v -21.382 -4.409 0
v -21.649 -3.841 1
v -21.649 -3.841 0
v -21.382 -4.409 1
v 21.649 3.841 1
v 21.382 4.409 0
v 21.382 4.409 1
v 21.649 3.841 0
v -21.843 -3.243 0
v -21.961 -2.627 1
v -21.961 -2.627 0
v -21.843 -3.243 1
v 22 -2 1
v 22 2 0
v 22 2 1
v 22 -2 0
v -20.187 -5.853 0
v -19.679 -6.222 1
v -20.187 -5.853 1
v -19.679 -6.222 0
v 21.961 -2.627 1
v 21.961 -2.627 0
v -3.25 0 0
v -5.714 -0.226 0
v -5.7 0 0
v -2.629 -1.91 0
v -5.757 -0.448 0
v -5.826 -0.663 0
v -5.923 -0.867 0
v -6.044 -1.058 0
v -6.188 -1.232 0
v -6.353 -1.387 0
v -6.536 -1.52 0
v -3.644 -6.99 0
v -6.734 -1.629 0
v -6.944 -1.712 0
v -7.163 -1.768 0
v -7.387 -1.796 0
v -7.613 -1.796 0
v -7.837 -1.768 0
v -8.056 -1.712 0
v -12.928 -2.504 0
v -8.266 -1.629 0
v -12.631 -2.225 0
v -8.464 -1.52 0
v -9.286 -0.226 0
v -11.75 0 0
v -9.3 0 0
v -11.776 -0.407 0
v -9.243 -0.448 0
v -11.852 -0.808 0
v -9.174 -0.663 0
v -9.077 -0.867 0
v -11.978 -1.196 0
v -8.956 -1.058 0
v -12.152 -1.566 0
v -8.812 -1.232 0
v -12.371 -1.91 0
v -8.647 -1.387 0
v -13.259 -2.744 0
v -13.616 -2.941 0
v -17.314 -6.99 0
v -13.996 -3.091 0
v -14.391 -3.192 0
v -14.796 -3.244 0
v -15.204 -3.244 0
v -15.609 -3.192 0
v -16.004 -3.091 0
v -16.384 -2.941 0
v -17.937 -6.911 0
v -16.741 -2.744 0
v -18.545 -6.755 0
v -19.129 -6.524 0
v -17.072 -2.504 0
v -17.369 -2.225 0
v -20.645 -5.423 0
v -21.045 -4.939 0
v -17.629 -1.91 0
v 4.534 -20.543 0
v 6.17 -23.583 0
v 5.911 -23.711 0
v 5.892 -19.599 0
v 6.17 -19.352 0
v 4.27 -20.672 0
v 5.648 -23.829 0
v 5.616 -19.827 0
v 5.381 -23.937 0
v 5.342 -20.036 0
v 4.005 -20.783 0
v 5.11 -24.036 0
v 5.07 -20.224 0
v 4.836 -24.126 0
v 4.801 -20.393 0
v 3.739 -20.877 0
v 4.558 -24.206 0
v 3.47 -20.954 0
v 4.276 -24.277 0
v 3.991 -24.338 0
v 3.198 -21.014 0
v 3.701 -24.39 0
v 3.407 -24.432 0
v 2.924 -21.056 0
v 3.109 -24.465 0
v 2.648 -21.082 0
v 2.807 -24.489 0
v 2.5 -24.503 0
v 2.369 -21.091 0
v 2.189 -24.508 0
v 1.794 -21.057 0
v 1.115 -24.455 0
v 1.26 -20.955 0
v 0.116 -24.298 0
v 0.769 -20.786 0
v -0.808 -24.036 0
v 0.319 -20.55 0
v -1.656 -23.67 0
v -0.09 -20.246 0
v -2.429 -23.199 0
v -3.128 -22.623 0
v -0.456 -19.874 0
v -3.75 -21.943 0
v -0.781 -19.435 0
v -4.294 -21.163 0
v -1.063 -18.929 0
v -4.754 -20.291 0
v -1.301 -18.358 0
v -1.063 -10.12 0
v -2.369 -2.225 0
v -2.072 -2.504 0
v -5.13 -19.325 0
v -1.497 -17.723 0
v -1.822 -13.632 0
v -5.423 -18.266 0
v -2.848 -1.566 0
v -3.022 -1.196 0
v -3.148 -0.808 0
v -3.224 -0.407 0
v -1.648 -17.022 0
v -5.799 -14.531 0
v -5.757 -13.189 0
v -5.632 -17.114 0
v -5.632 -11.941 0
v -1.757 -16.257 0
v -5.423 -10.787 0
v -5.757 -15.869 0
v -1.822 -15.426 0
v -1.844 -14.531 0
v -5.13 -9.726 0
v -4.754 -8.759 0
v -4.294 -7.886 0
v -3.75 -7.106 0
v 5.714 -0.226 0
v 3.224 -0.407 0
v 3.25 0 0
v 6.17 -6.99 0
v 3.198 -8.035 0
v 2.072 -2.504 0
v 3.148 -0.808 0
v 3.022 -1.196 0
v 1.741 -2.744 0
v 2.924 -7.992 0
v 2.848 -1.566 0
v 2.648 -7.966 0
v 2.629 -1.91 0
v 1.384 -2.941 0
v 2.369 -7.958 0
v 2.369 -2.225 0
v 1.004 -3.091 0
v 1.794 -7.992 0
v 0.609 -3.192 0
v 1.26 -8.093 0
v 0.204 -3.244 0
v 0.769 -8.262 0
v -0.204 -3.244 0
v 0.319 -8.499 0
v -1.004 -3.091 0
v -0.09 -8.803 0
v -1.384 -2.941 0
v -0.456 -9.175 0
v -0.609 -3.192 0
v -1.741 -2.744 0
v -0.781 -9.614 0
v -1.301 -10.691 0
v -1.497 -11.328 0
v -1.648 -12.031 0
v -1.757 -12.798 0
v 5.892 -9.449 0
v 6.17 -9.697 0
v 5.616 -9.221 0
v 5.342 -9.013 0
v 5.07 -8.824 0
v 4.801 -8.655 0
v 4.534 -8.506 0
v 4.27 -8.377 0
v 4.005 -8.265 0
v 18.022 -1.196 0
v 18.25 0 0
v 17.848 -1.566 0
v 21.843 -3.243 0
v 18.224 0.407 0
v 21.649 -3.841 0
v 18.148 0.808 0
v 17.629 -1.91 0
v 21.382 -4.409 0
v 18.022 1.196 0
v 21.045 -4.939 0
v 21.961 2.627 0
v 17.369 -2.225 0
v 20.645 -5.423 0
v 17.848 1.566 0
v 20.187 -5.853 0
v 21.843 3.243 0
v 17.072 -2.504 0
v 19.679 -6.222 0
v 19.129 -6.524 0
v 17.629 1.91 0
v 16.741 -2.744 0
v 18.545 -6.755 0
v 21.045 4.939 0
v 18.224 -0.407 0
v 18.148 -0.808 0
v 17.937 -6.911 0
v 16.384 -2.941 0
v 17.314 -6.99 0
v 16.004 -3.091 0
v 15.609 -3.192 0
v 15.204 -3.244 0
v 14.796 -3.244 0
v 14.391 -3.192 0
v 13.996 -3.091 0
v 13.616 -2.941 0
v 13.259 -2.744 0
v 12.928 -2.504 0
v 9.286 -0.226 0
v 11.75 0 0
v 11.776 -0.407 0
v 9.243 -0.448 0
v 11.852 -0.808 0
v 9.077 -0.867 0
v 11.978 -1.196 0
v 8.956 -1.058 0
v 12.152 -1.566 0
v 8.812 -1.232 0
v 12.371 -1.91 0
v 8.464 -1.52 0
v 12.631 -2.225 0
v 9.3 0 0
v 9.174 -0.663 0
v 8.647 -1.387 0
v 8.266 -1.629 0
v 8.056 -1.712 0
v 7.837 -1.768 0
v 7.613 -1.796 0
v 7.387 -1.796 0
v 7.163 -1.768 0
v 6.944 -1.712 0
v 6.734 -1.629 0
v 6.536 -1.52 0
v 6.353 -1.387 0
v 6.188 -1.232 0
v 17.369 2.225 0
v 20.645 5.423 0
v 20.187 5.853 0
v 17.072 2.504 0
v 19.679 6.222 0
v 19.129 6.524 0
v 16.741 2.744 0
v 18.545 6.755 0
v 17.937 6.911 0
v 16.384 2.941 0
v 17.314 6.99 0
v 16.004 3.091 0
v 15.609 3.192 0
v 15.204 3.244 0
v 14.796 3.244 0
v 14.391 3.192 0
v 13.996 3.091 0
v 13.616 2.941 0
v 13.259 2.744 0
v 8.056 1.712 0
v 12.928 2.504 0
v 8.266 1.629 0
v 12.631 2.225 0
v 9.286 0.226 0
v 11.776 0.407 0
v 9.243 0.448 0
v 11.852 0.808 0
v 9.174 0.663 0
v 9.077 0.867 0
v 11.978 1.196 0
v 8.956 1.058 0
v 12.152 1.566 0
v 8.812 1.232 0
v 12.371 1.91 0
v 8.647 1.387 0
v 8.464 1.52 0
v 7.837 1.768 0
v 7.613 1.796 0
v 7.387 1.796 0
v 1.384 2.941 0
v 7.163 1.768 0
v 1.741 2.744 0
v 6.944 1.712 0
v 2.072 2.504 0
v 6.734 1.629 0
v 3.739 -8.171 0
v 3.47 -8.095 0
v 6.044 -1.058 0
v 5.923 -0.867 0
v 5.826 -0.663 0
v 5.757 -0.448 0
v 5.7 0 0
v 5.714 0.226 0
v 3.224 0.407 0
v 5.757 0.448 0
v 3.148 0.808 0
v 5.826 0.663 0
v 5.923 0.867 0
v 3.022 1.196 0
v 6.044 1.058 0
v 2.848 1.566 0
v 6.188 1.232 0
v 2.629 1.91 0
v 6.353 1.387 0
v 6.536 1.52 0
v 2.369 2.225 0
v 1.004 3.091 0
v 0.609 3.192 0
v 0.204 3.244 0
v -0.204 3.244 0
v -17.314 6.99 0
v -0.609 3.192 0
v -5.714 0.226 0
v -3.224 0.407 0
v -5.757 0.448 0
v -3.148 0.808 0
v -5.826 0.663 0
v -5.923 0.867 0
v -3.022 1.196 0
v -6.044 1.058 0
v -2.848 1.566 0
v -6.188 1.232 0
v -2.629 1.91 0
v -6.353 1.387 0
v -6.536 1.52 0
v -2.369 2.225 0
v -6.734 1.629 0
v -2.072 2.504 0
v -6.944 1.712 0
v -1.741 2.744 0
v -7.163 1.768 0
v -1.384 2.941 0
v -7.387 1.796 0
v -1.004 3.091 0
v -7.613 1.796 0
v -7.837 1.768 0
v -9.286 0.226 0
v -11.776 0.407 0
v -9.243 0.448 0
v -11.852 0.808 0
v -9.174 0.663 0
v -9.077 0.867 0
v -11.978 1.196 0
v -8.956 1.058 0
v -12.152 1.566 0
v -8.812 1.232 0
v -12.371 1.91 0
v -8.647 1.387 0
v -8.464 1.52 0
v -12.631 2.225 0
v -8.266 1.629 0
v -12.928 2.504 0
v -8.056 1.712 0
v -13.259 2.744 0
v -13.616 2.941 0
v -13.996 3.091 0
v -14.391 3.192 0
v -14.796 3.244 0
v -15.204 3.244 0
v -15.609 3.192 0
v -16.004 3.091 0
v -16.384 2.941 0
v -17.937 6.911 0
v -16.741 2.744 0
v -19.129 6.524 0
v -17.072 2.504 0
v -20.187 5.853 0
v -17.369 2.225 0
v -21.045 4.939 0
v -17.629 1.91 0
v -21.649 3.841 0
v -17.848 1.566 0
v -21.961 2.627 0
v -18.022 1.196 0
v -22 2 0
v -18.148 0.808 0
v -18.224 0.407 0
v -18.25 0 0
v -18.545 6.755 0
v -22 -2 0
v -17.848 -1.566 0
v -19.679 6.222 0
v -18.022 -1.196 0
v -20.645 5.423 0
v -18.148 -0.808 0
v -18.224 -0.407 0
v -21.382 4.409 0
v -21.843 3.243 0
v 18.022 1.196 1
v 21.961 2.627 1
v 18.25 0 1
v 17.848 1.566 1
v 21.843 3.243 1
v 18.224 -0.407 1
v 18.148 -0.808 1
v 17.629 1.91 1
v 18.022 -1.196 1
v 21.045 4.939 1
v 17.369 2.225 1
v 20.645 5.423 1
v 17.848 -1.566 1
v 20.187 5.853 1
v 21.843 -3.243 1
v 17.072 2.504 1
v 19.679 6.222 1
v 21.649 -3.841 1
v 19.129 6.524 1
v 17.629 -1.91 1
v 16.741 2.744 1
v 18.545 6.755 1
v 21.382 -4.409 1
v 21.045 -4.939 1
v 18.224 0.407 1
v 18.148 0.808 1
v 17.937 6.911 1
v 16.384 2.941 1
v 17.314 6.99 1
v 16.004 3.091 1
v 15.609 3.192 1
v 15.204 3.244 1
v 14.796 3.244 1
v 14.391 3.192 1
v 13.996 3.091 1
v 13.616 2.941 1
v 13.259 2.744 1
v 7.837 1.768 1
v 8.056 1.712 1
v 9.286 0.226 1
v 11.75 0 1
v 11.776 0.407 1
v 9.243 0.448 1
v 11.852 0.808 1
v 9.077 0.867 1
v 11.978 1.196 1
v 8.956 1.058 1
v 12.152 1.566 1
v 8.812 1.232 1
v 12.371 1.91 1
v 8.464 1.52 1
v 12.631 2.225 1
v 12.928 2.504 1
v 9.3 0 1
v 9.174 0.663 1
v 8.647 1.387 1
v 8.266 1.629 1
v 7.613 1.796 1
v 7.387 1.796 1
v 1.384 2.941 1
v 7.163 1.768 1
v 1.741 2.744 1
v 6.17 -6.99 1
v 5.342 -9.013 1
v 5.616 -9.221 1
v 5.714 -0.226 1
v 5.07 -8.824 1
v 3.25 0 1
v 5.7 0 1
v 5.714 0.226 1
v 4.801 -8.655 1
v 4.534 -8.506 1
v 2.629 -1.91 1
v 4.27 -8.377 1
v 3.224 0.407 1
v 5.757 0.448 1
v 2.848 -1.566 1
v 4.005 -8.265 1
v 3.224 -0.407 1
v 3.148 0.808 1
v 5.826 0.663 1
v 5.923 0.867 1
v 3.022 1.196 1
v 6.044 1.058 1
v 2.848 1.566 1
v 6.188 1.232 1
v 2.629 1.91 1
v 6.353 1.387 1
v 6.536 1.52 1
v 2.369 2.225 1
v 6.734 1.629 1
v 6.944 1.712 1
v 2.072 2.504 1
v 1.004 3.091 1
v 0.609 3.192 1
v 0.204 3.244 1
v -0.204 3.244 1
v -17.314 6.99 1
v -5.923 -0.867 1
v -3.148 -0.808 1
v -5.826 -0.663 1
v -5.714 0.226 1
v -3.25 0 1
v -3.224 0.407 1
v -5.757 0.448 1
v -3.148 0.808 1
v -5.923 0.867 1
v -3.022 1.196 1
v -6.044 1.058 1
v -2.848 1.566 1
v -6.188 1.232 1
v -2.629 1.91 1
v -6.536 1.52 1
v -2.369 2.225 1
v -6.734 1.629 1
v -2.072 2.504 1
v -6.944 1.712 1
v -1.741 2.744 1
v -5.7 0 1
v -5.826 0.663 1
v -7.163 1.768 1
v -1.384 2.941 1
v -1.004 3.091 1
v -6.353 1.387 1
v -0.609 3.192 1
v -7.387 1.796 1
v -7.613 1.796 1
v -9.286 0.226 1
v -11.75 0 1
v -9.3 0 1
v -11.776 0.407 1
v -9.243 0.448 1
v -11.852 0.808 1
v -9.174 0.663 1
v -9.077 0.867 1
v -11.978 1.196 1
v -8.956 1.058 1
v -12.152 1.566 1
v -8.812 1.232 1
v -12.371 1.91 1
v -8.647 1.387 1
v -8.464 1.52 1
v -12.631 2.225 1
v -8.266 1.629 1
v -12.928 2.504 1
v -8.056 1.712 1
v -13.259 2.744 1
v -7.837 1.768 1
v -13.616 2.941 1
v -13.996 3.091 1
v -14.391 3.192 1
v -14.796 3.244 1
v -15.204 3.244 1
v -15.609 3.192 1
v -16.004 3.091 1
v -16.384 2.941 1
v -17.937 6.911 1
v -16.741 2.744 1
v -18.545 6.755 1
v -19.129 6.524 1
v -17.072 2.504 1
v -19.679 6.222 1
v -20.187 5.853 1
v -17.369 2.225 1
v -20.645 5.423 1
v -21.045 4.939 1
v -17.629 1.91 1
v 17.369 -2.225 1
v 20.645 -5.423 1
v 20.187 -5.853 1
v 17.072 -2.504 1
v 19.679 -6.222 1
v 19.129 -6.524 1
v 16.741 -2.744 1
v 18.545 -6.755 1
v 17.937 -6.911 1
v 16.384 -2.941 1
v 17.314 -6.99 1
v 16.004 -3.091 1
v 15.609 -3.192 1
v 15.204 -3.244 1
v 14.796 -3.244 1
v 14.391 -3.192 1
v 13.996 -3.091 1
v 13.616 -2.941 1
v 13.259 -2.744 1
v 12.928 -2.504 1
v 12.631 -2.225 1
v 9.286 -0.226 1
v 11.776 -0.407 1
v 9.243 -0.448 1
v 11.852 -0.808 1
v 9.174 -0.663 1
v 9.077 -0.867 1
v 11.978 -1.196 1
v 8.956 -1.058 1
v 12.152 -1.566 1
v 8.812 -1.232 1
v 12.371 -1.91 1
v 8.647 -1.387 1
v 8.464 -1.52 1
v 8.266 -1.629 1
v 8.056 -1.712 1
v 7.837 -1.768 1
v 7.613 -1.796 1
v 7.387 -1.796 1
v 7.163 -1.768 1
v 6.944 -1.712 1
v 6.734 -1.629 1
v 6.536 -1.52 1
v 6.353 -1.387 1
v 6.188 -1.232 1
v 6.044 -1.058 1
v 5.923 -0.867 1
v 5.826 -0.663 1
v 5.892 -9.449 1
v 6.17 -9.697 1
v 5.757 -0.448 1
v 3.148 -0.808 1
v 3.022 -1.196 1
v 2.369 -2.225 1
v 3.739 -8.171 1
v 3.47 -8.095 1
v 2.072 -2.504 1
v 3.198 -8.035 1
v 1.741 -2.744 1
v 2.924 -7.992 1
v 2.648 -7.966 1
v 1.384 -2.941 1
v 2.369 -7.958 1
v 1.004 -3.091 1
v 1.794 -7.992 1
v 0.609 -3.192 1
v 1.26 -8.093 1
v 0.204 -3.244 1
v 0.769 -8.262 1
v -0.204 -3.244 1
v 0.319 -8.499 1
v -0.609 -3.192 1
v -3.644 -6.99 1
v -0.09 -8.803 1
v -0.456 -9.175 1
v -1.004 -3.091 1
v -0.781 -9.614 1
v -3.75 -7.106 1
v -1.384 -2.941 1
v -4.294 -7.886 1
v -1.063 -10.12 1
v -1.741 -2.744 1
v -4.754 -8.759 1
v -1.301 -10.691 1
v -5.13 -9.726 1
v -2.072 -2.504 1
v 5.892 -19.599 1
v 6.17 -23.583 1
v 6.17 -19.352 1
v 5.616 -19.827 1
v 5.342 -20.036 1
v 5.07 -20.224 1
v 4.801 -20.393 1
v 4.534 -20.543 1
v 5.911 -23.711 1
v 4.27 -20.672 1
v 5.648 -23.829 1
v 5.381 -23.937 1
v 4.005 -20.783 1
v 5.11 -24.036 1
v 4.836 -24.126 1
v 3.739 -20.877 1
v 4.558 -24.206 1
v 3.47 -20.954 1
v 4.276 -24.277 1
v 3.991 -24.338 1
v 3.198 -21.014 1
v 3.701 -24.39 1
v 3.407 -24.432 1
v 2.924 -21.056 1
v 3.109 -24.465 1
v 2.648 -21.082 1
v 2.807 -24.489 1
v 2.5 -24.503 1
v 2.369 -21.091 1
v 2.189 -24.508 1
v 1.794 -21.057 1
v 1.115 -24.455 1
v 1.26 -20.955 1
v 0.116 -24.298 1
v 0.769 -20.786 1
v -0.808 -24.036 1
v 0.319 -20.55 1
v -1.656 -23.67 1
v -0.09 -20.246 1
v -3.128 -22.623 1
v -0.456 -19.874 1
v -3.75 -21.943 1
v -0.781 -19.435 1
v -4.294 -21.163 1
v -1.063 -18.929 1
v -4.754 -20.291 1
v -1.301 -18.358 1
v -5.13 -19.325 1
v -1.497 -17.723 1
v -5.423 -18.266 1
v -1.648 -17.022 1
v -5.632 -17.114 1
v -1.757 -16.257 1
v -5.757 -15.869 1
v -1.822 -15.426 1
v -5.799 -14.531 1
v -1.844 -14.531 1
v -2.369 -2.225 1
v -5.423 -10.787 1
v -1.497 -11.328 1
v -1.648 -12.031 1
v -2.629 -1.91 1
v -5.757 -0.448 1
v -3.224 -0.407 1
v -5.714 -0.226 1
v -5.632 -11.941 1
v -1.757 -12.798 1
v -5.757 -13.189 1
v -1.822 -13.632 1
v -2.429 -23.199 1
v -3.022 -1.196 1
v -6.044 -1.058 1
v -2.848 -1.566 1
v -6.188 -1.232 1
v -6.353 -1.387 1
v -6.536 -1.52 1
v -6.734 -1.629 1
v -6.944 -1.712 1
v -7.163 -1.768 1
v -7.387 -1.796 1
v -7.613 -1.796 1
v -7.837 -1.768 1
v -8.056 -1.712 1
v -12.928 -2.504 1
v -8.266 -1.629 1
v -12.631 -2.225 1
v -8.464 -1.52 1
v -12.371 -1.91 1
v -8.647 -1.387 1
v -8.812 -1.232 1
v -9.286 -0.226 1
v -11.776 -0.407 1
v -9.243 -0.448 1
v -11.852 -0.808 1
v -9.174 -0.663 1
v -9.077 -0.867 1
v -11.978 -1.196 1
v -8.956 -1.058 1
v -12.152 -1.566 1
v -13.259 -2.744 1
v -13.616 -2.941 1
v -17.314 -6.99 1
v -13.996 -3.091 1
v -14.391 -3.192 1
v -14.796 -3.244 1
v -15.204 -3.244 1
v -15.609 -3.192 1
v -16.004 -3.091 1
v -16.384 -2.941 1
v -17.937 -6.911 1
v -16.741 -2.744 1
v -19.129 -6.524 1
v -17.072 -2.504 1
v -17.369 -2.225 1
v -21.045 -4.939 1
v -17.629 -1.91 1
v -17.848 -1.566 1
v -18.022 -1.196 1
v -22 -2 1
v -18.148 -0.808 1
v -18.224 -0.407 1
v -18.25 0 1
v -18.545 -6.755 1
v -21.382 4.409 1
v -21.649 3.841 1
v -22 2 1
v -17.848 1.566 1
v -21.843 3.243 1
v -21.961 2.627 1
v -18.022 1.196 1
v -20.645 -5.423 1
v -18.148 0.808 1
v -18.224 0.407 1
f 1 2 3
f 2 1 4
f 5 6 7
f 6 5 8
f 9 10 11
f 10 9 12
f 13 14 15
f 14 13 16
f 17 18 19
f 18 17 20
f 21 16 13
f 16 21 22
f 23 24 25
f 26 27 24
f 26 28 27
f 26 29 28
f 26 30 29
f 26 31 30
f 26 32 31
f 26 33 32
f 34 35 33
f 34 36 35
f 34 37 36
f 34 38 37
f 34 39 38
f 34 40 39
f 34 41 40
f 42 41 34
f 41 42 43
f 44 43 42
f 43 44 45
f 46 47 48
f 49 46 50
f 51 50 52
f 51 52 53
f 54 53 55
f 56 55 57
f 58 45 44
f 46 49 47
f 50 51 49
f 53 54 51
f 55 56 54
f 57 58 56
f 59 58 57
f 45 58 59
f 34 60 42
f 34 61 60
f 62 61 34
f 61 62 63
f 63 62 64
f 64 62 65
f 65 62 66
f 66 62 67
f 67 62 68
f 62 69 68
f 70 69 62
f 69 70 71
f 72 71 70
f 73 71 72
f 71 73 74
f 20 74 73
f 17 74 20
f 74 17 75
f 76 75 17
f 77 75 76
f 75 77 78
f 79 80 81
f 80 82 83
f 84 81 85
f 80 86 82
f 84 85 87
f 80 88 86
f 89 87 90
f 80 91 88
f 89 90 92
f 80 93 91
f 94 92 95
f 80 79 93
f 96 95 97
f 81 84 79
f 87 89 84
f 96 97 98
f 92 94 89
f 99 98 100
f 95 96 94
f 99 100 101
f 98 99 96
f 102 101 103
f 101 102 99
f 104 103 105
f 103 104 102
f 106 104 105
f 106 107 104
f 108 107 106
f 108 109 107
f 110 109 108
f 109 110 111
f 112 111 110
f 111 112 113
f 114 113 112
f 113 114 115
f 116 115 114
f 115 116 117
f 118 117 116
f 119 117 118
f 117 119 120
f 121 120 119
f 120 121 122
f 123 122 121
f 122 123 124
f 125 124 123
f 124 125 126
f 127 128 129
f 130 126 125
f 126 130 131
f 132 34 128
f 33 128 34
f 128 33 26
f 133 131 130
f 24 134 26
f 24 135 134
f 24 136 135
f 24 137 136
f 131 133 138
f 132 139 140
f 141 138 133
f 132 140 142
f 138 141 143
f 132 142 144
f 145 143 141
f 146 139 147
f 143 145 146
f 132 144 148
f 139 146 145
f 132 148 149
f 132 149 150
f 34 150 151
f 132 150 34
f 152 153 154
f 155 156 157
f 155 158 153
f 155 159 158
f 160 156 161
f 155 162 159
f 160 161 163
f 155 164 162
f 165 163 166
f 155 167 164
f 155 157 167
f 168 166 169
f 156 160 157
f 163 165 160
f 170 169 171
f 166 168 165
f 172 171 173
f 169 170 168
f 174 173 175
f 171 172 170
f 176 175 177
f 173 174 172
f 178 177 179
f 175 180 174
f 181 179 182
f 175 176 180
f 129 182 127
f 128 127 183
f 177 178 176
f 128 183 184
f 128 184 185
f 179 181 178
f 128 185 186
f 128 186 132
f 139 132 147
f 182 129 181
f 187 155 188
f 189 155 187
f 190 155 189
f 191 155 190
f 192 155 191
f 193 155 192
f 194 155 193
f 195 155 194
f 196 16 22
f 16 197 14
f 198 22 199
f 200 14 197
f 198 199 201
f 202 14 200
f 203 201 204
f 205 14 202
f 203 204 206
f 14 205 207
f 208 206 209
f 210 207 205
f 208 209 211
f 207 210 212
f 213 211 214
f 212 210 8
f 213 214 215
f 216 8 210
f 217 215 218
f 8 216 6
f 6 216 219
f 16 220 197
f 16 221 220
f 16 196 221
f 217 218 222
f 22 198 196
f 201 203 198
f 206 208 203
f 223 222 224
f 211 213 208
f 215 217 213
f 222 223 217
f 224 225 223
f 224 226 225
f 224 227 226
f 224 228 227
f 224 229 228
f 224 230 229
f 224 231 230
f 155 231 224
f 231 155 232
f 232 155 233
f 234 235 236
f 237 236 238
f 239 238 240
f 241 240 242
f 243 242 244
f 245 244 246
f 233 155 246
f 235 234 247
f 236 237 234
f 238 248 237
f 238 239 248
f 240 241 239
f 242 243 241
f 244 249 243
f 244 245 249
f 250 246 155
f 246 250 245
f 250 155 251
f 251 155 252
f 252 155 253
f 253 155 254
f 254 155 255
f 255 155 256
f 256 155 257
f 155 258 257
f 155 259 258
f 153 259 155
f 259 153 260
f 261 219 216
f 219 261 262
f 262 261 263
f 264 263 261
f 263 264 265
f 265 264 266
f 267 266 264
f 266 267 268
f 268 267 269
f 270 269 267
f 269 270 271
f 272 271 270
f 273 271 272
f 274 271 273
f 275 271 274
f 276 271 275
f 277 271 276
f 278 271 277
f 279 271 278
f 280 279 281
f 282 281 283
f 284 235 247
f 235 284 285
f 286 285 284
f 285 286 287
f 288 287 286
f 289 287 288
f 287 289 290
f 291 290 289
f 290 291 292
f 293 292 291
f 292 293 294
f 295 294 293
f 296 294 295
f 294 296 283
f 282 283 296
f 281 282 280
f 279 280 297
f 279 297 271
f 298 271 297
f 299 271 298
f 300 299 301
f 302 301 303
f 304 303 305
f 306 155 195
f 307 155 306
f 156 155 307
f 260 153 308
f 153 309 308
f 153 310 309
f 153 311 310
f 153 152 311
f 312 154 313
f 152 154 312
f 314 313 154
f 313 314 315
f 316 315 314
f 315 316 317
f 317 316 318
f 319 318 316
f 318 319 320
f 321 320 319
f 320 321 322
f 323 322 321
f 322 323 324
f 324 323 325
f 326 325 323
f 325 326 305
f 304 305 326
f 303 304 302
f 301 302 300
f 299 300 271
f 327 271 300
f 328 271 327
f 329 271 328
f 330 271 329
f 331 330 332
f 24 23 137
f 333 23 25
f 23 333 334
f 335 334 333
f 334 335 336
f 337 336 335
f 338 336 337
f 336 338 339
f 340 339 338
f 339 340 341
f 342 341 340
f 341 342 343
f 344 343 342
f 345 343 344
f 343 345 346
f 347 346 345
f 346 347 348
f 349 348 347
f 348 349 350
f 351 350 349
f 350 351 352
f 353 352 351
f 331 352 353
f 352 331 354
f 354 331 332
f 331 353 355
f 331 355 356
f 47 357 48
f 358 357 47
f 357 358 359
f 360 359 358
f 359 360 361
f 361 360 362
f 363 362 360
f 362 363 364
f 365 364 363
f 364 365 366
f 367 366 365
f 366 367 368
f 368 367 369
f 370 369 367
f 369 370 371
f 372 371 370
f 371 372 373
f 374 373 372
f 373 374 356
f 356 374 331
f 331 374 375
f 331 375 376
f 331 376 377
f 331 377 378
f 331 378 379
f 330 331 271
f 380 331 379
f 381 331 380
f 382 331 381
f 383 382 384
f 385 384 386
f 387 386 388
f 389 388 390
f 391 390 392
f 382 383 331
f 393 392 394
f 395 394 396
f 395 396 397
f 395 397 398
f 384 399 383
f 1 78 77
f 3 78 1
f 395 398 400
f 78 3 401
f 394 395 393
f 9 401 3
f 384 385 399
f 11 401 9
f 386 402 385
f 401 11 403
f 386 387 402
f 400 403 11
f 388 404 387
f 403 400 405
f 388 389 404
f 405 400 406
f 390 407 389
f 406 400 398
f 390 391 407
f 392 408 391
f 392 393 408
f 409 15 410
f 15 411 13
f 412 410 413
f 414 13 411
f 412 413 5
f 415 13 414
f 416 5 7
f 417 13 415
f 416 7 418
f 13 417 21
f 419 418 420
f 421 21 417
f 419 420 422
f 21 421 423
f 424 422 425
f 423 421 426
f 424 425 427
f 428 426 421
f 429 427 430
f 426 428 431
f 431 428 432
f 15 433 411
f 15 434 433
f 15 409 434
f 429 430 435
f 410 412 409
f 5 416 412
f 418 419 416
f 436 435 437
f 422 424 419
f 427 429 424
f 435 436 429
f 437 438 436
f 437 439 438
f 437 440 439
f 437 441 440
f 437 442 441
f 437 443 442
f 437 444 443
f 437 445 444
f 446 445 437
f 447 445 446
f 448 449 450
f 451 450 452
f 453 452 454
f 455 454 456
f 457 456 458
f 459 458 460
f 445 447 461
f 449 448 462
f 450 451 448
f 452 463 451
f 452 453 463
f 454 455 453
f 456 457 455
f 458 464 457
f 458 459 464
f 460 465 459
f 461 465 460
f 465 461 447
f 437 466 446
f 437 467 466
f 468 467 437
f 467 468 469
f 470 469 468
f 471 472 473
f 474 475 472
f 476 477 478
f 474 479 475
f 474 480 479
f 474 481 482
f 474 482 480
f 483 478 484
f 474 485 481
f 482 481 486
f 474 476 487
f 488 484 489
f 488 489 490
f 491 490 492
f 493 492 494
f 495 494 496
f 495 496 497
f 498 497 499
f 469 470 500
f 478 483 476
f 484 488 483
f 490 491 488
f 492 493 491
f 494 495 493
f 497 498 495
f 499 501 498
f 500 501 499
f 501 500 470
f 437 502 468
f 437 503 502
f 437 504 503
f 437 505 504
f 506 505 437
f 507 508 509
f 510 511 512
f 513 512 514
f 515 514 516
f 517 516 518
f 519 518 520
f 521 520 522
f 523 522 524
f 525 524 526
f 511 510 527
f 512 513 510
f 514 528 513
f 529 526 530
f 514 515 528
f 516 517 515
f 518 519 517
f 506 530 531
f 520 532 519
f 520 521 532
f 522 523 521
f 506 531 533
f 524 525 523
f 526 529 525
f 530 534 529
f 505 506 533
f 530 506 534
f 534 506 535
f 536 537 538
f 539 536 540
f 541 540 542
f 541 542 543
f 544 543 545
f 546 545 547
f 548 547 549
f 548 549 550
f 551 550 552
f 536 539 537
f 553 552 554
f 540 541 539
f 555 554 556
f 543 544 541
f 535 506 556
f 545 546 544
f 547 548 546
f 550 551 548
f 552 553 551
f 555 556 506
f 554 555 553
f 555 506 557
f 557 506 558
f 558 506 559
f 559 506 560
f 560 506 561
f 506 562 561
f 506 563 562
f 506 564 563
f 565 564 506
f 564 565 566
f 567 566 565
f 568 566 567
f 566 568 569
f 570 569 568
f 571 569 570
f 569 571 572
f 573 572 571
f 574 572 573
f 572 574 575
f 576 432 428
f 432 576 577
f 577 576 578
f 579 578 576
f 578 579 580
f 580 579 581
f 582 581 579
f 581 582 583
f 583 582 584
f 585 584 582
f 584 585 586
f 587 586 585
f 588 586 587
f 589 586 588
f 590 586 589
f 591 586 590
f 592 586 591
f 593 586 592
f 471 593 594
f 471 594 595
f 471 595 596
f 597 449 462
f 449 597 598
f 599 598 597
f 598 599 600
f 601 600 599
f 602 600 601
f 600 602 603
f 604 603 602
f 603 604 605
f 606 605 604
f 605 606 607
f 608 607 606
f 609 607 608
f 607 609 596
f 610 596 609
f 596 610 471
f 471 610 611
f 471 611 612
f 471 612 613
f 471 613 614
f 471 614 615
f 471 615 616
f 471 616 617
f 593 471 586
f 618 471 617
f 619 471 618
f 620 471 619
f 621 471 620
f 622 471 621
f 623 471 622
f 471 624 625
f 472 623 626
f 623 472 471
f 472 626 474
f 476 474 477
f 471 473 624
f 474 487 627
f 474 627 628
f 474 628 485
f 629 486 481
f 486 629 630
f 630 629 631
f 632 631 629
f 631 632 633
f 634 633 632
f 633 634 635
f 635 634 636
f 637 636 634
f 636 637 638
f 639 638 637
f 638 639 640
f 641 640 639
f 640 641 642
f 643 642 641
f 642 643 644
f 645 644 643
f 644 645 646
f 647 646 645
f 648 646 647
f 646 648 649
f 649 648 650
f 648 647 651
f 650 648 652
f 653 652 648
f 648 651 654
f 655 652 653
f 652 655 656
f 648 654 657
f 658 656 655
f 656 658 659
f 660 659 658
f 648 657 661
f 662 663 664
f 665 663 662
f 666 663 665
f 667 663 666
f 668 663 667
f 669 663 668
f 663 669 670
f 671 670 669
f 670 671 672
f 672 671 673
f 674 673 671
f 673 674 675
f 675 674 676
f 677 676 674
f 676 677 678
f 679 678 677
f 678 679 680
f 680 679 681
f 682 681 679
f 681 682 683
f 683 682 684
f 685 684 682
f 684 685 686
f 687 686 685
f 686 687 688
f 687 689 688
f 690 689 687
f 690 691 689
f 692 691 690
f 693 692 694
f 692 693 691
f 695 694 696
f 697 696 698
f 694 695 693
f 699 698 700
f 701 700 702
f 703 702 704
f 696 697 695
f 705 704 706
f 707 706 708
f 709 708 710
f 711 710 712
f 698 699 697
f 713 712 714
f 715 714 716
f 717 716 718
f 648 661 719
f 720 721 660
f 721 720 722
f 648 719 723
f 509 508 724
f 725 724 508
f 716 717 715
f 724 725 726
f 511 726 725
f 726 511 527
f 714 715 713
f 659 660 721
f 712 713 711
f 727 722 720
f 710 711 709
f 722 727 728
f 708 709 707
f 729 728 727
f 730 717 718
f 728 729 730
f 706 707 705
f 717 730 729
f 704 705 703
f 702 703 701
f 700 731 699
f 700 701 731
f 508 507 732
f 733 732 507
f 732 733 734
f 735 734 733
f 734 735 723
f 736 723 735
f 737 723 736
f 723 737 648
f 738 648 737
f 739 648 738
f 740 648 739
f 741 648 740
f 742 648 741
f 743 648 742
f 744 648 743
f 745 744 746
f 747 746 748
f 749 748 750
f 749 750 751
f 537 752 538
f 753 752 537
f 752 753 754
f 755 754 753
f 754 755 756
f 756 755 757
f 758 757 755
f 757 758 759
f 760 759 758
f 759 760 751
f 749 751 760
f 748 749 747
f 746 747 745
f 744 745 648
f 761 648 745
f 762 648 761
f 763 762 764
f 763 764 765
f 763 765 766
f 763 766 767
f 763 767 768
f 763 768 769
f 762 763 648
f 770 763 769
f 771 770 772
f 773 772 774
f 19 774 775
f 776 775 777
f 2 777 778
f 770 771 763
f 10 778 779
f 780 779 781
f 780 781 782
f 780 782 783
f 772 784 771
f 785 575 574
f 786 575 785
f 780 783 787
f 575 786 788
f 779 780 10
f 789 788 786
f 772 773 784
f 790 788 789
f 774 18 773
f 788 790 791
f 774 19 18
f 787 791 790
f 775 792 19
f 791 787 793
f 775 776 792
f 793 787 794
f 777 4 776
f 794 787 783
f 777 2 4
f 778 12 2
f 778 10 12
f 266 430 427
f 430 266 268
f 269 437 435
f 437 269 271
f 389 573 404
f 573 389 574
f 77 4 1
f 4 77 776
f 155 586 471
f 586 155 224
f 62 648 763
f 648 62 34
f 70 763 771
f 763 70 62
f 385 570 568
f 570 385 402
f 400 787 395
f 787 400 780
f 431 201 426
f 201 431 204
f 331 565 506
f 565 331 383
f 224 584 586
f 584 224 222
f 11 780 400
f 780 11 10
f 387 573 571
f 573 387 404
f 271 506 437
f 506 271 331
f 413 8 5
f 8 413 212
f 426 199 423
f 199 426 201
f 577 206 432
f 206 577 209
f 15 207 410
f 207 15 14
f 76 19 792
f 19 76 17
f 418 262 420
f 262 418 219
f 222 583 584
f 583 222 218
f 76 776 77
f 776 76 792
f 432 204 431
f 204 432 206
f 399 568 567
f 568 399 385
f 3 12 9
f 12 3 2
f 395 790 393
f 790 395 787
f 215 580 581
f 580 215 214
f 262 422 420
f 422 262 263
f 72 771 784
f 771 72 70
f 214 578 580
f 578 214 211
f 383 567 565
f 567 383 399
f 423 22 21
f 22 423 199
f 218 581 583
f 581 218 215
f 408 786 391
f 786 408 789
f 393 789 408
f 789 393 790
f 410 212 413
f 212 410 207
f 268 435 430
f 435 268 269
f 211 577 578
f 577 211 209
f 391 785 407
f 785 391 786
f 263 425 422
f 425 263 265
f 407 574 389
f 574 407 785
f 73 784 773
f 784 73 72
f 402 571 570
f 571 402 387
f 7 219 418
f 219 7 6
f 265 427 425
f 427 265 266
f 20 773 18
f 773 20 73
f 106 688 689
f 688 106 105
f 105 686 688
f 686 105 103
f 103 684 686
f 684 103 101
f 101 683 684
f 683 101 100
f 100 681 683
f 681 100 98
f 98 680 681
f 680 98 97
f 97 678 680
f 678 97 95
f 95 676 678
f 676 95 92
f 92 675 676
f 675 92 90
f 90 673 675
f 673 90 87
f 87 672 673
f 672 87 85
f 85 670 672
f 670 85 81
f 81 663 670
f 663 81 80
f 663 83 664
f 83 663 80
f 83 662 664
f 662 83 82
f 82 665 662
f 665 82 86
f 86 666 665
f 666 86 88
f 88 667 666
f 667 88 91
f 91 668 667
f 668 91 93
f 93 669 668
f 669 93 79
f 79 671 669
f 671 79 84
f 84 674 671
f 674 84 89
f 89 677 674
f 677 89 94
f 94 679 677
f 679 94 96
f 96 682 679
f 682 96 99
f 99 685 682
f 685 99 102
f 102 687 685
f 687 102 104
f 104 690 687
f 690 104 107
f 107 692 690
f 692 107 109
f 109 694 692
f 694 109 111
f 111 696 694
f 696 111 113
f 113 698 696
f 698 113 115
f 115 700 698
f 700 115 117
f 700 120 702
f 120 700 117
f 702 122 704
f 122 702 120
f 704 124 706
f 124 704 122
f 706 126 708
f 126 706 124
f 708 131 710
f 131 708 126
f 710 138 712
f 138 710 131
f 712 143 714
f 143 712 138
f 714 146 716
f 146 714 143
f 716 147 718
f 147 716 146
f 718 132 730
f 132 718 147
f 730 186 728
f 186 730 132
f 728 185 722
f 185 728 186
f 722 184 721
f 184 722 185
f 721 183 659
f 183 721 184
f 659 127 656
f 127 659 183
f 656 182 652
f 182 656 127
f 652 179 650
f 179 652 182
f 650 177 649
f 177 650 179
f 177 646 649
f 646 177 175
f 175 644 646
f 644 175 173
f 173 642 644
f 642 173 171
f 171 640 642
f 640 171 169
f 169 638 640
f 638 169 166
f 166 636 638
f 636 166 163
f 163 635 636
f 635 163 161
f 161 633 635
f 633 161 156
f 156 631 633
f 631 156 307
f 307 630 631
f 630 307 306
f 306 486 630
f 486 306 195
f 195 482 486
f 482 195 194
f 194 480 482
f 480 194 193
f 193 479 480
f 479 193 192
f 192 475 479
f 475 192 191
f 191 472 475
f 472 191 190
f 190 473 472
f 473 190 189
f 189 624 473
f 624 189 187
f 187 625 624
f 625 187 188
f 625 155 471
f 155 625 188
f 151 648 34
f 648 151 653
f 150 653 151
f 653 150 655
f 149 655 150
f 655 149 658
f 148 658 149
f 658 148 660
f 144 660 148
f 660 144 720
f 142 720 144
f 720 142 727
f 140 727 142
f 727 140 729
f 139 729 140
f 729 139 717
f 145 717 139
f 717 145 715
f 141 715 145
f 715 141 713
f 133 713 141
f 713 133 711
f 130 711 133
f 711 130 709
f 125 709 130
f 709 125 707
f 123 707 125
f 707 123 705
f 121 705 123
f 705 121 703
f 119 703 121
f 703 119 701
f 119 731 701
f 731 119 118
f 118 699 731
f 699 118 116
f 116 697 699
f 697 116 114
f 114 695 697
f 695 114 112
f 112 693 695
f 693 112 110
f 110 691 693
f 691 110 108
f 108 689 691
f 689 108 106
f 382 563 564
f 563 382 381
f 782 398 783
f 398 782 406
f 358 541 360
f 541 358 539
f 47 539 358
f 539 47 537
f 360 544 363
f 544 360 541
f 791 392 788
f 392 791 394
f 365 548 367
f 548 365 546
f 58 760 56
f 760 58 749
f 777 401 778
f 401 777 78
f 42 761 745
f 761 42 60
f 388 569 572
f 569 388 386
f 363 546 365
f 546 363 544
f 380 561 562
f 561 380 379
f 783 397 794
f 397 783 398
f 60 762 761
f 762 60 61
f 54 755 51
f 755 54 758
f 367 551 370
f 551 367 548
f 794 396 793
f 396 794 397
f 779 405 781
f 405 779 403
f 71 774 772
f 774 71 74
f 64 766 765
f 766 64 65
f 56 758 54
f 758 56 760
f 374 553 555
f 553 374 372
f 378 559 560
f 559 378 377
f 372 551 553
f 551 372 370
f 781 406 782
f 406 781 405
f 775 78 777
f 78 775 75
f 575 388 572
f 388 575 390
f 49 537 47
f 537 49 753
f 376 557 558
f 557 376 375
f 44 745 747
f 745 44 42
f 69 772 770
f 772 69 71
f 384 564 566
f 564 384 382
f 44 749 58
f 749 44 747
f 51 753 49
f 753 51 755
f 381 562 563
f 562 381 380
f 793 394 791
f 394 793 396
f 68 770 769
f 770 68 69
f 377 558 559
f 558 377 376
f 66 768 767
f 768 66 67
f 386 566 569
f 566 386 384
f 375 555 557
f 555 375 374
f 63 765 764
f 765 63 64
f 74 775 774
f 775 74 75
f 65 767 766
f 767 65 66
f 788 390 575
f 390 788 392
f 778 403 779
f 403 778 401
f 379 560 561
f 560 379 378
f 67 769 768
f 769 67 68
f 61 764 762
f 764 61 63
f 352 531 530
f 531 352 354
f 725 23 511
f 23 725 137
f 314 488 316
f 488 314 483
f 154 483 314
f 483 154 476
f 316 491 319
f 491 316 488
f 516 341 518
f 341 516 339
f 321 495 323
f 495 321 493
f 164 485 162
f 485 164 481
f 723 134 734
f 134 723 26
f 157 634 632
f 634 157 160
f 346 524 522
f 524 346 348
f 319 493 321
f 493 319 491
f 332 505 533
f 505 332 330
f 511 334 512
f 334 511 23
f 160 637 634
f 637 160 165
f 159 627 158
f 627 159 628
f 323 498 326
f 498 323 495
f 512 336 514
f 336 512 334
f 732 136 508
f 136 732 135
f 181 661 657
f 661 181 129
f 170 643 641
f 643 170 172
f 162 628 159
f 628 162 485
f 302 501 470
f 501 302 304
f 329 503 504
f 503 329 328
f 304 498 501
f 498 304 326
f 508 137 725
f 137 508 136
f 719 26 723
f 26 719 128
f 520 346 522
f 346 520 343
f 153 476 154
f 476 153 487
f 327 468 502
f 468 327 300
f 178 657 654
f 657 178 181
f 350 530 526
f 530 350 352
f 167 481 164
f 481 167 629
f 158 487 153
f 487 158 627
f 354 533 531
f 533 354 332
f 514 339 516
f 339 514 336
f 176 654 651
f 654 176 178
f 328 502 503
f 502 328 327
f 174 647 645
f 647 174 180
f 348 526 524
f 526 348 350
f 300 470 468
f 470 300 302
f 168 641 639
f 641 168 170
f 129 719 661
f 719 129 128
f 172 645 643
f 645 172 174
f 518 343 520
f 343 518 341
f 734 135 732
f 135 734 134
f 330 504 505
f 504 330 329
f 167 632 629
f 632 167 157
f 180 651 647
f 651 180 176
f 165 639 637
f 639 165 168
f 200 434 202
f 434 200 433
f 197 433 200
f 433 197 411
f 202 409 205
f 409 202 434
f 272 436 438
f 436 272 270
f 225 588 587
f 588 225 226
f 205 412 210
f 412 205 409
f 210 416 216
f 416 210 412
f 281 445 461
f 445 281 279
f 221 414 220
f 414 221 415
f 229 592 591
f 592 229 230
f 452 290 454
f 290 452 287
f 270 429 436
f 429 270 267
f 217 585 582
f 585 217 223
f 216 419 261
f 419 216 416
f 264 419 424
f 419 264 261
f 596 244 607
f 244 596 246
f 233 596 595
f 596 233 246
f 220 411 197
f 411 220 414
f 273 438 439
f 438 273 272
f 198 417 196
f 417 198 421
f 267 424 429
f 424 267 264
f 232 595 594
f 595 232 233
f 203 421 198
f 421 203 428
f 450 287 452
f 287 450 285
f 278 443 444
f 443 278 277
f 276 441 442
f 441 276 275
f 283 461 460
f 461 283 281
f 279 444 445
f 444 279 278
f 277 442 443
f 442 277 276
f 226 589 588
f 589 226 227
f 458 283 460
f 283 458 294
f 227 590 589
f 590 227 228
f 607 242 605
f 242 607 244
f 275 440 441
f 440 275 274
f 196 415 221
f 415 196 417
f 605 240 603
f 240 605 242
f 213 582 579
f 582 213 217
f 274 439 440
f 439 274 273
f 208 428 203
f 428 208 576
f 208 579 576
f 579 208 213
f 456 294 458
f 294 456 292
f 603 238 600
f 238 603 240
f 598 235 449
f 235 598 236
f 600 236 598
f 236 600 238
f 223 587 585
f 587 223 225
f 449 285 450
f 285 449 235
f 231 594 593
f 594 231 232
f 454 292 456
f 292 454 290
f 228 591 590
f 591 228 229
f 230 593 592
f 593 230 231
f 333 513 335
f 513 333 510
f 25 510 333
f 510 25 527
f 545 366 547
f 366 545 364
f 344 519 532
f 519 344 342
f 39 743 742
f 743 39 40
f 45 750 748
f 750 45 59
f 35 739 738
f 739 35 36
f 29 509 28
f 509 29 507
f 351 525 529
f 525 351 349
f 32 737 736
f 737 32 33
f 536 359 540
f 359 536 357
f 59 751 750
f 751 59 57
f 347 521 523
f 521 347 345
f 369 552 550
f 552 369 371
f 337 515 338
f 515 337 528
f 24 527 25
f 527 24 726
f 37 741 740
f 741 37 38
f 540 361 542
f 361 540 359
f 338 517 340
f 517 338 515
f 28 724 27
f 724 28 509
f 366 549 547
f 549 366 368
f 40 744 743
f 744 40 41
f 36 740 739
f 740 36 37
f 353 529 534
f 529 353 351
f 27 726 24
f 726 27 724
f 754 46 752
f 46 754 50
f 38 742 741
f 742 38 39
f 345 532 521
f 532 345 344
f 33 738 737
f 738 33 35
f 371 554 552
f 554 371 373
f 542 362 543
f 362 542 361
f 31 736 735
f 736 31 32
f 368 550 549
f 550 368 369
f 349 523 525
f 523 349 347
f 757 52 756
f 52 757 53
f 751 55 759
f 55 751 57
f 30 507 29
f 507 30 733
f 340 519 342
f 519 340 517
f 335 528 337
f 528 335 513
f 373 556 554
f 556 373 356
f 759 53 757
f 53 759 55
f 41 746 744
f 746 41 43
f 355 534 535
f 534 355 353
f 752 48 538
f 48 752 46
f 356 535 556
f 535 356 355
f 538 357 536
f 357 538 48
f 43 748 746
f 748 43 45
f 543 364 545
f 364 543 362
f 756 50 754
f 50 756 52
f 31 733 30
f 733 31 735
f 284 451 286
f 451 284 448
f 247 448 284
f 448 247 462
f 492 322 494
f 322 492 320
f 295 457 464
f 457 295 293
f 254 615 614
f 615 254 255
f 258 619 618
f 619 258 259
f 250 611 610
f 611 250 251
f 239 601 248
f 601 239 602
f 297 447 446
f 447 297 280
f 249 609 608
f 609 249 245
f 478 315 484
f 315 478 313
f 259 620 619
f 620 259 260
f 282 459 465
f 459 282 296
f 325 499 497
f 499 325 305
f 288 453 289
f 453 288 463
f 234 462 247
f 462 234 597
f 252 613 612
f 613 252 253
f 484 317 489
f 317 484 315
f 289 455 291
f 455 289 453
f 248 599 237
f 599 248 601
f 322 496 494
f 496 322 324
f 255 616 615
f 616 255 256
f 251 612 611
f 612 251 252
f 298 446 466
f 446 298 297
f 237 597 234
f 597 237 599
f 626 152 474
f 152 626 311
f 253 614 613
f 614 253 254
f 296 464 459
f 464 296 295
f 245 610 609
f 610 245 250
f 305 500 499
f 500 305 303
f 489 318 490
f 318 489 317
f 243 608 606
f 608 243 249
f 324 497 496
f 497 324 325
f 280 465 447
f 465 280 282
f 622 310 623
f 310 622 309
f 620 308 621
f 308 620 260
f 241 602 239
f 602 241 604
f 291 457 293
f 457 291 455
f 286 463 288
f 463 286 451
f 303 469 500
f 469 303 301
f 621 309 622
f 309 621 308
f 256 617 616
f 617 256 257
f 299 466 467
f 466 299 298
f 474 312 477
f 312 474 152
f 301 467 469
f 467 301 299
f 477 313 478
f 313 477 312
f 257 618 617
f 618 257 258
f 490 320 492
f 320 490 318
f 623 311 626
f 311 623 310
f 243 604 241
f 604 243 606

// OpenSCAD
$fn = 50;


difference() {
	union() {
		*color(alpha = 1.0000000000, c = "gray") {
			translate(v = [0, 14, 0]) {
				linear_extrude(height = 1) {
					text(font = "Arial:style=Bold", halign = "center", size = 4.5000000000, text = "COMMENT description oobb_plate_shape_p_type_1_depth_3_width_1_thickness_c_extra_oobb_size", valign = "center");
				}
			}
		}
		hull() {
			translate(v = [-17.0000000000, 2.0000000000, 0]) {
				cylinder(h = 1, r = 5);
			}
			translate(v = [17.0000000000, 2.0000000000, 0]) {
				cylinder(h = 1, r = 5);
			}
			translate(v = [-17.0000000000, -2.0000000000, 0]) {
				cylinder(h = 1, r = 5);
			}
			translate(v = [17.0000000000, -2.0000000000, 0]) {
				cylinder(h = 1, r = 5);
			}
		}
		translate(v = [0, -5, 0]) {
			linear_extrude(height = 1) {
				text(font = "DejaVu Sans Mono:style=Bold", halign = "center", size = 19.0000000000, text = "C", valign = "top");
			}
		}
	}
	union() {
		*color(alpha = 1.0000000000, c = "gray") {
			translate(v = [0, 14, 0]) {
				linear_extrude(height = 1) {
					text(font = "Arial:style=Bold", halign = "center", size = 4.5000000000, text = "COMMENT description oobb_holes_shape_n_type_3_width_1_thickness_c_extra_oobb_size_1_height_'all'_holes_true_both_holes", valign = "center");
				}
			}
		}
		translate(v = [-15.0000000000, 0.0000000000, 0]) {
			translate(v = [0, 0, -50]) {
				cylinder(h = 100, r = 3.2500000000);
			}
		}
		translate(v = [0, 0, -50]) {
			cylinder(h = 100, r = 3.2500000000);
		}
		translate(v = [15.0000000000, 0.0000000000, 0]) {
			translate(v = [0, 0, -50]) {
				cylinder(h = 100, r = 3.2500000000);
			}
		}
		translate(v = [-15.0000000000, 0.0000000000, 0]) {
			translate(v = [0, 0, -50]) {
				cylinder(h = 100, r = 1.8000000000);
			}
		}
		translate(v = [-7.5000000000, 0.0000000000, 0]) {
			translate(v = [0, 0, -50]) {
				cylinder(h = 100, r = 1.8000000000);
			}
		}
		translate(v = [0, 0, -50]) {
			cylinder(h = 100, r = 1.8000000000);
		}
		translate(v = [7.5000000000, 0.0000000000, 0]) {
			translate(v = [0, 0, -50]) {
				cylinder(h = 100, r = 1.8000000000);
			}
		}
		translate(v = [15.0000000000, 0.0000000000, 0]) {
			translate(v = [0, 0, -50]) {
				cylinder(h = 100, r = 1.8000000000);
			}
		}
	}
}
